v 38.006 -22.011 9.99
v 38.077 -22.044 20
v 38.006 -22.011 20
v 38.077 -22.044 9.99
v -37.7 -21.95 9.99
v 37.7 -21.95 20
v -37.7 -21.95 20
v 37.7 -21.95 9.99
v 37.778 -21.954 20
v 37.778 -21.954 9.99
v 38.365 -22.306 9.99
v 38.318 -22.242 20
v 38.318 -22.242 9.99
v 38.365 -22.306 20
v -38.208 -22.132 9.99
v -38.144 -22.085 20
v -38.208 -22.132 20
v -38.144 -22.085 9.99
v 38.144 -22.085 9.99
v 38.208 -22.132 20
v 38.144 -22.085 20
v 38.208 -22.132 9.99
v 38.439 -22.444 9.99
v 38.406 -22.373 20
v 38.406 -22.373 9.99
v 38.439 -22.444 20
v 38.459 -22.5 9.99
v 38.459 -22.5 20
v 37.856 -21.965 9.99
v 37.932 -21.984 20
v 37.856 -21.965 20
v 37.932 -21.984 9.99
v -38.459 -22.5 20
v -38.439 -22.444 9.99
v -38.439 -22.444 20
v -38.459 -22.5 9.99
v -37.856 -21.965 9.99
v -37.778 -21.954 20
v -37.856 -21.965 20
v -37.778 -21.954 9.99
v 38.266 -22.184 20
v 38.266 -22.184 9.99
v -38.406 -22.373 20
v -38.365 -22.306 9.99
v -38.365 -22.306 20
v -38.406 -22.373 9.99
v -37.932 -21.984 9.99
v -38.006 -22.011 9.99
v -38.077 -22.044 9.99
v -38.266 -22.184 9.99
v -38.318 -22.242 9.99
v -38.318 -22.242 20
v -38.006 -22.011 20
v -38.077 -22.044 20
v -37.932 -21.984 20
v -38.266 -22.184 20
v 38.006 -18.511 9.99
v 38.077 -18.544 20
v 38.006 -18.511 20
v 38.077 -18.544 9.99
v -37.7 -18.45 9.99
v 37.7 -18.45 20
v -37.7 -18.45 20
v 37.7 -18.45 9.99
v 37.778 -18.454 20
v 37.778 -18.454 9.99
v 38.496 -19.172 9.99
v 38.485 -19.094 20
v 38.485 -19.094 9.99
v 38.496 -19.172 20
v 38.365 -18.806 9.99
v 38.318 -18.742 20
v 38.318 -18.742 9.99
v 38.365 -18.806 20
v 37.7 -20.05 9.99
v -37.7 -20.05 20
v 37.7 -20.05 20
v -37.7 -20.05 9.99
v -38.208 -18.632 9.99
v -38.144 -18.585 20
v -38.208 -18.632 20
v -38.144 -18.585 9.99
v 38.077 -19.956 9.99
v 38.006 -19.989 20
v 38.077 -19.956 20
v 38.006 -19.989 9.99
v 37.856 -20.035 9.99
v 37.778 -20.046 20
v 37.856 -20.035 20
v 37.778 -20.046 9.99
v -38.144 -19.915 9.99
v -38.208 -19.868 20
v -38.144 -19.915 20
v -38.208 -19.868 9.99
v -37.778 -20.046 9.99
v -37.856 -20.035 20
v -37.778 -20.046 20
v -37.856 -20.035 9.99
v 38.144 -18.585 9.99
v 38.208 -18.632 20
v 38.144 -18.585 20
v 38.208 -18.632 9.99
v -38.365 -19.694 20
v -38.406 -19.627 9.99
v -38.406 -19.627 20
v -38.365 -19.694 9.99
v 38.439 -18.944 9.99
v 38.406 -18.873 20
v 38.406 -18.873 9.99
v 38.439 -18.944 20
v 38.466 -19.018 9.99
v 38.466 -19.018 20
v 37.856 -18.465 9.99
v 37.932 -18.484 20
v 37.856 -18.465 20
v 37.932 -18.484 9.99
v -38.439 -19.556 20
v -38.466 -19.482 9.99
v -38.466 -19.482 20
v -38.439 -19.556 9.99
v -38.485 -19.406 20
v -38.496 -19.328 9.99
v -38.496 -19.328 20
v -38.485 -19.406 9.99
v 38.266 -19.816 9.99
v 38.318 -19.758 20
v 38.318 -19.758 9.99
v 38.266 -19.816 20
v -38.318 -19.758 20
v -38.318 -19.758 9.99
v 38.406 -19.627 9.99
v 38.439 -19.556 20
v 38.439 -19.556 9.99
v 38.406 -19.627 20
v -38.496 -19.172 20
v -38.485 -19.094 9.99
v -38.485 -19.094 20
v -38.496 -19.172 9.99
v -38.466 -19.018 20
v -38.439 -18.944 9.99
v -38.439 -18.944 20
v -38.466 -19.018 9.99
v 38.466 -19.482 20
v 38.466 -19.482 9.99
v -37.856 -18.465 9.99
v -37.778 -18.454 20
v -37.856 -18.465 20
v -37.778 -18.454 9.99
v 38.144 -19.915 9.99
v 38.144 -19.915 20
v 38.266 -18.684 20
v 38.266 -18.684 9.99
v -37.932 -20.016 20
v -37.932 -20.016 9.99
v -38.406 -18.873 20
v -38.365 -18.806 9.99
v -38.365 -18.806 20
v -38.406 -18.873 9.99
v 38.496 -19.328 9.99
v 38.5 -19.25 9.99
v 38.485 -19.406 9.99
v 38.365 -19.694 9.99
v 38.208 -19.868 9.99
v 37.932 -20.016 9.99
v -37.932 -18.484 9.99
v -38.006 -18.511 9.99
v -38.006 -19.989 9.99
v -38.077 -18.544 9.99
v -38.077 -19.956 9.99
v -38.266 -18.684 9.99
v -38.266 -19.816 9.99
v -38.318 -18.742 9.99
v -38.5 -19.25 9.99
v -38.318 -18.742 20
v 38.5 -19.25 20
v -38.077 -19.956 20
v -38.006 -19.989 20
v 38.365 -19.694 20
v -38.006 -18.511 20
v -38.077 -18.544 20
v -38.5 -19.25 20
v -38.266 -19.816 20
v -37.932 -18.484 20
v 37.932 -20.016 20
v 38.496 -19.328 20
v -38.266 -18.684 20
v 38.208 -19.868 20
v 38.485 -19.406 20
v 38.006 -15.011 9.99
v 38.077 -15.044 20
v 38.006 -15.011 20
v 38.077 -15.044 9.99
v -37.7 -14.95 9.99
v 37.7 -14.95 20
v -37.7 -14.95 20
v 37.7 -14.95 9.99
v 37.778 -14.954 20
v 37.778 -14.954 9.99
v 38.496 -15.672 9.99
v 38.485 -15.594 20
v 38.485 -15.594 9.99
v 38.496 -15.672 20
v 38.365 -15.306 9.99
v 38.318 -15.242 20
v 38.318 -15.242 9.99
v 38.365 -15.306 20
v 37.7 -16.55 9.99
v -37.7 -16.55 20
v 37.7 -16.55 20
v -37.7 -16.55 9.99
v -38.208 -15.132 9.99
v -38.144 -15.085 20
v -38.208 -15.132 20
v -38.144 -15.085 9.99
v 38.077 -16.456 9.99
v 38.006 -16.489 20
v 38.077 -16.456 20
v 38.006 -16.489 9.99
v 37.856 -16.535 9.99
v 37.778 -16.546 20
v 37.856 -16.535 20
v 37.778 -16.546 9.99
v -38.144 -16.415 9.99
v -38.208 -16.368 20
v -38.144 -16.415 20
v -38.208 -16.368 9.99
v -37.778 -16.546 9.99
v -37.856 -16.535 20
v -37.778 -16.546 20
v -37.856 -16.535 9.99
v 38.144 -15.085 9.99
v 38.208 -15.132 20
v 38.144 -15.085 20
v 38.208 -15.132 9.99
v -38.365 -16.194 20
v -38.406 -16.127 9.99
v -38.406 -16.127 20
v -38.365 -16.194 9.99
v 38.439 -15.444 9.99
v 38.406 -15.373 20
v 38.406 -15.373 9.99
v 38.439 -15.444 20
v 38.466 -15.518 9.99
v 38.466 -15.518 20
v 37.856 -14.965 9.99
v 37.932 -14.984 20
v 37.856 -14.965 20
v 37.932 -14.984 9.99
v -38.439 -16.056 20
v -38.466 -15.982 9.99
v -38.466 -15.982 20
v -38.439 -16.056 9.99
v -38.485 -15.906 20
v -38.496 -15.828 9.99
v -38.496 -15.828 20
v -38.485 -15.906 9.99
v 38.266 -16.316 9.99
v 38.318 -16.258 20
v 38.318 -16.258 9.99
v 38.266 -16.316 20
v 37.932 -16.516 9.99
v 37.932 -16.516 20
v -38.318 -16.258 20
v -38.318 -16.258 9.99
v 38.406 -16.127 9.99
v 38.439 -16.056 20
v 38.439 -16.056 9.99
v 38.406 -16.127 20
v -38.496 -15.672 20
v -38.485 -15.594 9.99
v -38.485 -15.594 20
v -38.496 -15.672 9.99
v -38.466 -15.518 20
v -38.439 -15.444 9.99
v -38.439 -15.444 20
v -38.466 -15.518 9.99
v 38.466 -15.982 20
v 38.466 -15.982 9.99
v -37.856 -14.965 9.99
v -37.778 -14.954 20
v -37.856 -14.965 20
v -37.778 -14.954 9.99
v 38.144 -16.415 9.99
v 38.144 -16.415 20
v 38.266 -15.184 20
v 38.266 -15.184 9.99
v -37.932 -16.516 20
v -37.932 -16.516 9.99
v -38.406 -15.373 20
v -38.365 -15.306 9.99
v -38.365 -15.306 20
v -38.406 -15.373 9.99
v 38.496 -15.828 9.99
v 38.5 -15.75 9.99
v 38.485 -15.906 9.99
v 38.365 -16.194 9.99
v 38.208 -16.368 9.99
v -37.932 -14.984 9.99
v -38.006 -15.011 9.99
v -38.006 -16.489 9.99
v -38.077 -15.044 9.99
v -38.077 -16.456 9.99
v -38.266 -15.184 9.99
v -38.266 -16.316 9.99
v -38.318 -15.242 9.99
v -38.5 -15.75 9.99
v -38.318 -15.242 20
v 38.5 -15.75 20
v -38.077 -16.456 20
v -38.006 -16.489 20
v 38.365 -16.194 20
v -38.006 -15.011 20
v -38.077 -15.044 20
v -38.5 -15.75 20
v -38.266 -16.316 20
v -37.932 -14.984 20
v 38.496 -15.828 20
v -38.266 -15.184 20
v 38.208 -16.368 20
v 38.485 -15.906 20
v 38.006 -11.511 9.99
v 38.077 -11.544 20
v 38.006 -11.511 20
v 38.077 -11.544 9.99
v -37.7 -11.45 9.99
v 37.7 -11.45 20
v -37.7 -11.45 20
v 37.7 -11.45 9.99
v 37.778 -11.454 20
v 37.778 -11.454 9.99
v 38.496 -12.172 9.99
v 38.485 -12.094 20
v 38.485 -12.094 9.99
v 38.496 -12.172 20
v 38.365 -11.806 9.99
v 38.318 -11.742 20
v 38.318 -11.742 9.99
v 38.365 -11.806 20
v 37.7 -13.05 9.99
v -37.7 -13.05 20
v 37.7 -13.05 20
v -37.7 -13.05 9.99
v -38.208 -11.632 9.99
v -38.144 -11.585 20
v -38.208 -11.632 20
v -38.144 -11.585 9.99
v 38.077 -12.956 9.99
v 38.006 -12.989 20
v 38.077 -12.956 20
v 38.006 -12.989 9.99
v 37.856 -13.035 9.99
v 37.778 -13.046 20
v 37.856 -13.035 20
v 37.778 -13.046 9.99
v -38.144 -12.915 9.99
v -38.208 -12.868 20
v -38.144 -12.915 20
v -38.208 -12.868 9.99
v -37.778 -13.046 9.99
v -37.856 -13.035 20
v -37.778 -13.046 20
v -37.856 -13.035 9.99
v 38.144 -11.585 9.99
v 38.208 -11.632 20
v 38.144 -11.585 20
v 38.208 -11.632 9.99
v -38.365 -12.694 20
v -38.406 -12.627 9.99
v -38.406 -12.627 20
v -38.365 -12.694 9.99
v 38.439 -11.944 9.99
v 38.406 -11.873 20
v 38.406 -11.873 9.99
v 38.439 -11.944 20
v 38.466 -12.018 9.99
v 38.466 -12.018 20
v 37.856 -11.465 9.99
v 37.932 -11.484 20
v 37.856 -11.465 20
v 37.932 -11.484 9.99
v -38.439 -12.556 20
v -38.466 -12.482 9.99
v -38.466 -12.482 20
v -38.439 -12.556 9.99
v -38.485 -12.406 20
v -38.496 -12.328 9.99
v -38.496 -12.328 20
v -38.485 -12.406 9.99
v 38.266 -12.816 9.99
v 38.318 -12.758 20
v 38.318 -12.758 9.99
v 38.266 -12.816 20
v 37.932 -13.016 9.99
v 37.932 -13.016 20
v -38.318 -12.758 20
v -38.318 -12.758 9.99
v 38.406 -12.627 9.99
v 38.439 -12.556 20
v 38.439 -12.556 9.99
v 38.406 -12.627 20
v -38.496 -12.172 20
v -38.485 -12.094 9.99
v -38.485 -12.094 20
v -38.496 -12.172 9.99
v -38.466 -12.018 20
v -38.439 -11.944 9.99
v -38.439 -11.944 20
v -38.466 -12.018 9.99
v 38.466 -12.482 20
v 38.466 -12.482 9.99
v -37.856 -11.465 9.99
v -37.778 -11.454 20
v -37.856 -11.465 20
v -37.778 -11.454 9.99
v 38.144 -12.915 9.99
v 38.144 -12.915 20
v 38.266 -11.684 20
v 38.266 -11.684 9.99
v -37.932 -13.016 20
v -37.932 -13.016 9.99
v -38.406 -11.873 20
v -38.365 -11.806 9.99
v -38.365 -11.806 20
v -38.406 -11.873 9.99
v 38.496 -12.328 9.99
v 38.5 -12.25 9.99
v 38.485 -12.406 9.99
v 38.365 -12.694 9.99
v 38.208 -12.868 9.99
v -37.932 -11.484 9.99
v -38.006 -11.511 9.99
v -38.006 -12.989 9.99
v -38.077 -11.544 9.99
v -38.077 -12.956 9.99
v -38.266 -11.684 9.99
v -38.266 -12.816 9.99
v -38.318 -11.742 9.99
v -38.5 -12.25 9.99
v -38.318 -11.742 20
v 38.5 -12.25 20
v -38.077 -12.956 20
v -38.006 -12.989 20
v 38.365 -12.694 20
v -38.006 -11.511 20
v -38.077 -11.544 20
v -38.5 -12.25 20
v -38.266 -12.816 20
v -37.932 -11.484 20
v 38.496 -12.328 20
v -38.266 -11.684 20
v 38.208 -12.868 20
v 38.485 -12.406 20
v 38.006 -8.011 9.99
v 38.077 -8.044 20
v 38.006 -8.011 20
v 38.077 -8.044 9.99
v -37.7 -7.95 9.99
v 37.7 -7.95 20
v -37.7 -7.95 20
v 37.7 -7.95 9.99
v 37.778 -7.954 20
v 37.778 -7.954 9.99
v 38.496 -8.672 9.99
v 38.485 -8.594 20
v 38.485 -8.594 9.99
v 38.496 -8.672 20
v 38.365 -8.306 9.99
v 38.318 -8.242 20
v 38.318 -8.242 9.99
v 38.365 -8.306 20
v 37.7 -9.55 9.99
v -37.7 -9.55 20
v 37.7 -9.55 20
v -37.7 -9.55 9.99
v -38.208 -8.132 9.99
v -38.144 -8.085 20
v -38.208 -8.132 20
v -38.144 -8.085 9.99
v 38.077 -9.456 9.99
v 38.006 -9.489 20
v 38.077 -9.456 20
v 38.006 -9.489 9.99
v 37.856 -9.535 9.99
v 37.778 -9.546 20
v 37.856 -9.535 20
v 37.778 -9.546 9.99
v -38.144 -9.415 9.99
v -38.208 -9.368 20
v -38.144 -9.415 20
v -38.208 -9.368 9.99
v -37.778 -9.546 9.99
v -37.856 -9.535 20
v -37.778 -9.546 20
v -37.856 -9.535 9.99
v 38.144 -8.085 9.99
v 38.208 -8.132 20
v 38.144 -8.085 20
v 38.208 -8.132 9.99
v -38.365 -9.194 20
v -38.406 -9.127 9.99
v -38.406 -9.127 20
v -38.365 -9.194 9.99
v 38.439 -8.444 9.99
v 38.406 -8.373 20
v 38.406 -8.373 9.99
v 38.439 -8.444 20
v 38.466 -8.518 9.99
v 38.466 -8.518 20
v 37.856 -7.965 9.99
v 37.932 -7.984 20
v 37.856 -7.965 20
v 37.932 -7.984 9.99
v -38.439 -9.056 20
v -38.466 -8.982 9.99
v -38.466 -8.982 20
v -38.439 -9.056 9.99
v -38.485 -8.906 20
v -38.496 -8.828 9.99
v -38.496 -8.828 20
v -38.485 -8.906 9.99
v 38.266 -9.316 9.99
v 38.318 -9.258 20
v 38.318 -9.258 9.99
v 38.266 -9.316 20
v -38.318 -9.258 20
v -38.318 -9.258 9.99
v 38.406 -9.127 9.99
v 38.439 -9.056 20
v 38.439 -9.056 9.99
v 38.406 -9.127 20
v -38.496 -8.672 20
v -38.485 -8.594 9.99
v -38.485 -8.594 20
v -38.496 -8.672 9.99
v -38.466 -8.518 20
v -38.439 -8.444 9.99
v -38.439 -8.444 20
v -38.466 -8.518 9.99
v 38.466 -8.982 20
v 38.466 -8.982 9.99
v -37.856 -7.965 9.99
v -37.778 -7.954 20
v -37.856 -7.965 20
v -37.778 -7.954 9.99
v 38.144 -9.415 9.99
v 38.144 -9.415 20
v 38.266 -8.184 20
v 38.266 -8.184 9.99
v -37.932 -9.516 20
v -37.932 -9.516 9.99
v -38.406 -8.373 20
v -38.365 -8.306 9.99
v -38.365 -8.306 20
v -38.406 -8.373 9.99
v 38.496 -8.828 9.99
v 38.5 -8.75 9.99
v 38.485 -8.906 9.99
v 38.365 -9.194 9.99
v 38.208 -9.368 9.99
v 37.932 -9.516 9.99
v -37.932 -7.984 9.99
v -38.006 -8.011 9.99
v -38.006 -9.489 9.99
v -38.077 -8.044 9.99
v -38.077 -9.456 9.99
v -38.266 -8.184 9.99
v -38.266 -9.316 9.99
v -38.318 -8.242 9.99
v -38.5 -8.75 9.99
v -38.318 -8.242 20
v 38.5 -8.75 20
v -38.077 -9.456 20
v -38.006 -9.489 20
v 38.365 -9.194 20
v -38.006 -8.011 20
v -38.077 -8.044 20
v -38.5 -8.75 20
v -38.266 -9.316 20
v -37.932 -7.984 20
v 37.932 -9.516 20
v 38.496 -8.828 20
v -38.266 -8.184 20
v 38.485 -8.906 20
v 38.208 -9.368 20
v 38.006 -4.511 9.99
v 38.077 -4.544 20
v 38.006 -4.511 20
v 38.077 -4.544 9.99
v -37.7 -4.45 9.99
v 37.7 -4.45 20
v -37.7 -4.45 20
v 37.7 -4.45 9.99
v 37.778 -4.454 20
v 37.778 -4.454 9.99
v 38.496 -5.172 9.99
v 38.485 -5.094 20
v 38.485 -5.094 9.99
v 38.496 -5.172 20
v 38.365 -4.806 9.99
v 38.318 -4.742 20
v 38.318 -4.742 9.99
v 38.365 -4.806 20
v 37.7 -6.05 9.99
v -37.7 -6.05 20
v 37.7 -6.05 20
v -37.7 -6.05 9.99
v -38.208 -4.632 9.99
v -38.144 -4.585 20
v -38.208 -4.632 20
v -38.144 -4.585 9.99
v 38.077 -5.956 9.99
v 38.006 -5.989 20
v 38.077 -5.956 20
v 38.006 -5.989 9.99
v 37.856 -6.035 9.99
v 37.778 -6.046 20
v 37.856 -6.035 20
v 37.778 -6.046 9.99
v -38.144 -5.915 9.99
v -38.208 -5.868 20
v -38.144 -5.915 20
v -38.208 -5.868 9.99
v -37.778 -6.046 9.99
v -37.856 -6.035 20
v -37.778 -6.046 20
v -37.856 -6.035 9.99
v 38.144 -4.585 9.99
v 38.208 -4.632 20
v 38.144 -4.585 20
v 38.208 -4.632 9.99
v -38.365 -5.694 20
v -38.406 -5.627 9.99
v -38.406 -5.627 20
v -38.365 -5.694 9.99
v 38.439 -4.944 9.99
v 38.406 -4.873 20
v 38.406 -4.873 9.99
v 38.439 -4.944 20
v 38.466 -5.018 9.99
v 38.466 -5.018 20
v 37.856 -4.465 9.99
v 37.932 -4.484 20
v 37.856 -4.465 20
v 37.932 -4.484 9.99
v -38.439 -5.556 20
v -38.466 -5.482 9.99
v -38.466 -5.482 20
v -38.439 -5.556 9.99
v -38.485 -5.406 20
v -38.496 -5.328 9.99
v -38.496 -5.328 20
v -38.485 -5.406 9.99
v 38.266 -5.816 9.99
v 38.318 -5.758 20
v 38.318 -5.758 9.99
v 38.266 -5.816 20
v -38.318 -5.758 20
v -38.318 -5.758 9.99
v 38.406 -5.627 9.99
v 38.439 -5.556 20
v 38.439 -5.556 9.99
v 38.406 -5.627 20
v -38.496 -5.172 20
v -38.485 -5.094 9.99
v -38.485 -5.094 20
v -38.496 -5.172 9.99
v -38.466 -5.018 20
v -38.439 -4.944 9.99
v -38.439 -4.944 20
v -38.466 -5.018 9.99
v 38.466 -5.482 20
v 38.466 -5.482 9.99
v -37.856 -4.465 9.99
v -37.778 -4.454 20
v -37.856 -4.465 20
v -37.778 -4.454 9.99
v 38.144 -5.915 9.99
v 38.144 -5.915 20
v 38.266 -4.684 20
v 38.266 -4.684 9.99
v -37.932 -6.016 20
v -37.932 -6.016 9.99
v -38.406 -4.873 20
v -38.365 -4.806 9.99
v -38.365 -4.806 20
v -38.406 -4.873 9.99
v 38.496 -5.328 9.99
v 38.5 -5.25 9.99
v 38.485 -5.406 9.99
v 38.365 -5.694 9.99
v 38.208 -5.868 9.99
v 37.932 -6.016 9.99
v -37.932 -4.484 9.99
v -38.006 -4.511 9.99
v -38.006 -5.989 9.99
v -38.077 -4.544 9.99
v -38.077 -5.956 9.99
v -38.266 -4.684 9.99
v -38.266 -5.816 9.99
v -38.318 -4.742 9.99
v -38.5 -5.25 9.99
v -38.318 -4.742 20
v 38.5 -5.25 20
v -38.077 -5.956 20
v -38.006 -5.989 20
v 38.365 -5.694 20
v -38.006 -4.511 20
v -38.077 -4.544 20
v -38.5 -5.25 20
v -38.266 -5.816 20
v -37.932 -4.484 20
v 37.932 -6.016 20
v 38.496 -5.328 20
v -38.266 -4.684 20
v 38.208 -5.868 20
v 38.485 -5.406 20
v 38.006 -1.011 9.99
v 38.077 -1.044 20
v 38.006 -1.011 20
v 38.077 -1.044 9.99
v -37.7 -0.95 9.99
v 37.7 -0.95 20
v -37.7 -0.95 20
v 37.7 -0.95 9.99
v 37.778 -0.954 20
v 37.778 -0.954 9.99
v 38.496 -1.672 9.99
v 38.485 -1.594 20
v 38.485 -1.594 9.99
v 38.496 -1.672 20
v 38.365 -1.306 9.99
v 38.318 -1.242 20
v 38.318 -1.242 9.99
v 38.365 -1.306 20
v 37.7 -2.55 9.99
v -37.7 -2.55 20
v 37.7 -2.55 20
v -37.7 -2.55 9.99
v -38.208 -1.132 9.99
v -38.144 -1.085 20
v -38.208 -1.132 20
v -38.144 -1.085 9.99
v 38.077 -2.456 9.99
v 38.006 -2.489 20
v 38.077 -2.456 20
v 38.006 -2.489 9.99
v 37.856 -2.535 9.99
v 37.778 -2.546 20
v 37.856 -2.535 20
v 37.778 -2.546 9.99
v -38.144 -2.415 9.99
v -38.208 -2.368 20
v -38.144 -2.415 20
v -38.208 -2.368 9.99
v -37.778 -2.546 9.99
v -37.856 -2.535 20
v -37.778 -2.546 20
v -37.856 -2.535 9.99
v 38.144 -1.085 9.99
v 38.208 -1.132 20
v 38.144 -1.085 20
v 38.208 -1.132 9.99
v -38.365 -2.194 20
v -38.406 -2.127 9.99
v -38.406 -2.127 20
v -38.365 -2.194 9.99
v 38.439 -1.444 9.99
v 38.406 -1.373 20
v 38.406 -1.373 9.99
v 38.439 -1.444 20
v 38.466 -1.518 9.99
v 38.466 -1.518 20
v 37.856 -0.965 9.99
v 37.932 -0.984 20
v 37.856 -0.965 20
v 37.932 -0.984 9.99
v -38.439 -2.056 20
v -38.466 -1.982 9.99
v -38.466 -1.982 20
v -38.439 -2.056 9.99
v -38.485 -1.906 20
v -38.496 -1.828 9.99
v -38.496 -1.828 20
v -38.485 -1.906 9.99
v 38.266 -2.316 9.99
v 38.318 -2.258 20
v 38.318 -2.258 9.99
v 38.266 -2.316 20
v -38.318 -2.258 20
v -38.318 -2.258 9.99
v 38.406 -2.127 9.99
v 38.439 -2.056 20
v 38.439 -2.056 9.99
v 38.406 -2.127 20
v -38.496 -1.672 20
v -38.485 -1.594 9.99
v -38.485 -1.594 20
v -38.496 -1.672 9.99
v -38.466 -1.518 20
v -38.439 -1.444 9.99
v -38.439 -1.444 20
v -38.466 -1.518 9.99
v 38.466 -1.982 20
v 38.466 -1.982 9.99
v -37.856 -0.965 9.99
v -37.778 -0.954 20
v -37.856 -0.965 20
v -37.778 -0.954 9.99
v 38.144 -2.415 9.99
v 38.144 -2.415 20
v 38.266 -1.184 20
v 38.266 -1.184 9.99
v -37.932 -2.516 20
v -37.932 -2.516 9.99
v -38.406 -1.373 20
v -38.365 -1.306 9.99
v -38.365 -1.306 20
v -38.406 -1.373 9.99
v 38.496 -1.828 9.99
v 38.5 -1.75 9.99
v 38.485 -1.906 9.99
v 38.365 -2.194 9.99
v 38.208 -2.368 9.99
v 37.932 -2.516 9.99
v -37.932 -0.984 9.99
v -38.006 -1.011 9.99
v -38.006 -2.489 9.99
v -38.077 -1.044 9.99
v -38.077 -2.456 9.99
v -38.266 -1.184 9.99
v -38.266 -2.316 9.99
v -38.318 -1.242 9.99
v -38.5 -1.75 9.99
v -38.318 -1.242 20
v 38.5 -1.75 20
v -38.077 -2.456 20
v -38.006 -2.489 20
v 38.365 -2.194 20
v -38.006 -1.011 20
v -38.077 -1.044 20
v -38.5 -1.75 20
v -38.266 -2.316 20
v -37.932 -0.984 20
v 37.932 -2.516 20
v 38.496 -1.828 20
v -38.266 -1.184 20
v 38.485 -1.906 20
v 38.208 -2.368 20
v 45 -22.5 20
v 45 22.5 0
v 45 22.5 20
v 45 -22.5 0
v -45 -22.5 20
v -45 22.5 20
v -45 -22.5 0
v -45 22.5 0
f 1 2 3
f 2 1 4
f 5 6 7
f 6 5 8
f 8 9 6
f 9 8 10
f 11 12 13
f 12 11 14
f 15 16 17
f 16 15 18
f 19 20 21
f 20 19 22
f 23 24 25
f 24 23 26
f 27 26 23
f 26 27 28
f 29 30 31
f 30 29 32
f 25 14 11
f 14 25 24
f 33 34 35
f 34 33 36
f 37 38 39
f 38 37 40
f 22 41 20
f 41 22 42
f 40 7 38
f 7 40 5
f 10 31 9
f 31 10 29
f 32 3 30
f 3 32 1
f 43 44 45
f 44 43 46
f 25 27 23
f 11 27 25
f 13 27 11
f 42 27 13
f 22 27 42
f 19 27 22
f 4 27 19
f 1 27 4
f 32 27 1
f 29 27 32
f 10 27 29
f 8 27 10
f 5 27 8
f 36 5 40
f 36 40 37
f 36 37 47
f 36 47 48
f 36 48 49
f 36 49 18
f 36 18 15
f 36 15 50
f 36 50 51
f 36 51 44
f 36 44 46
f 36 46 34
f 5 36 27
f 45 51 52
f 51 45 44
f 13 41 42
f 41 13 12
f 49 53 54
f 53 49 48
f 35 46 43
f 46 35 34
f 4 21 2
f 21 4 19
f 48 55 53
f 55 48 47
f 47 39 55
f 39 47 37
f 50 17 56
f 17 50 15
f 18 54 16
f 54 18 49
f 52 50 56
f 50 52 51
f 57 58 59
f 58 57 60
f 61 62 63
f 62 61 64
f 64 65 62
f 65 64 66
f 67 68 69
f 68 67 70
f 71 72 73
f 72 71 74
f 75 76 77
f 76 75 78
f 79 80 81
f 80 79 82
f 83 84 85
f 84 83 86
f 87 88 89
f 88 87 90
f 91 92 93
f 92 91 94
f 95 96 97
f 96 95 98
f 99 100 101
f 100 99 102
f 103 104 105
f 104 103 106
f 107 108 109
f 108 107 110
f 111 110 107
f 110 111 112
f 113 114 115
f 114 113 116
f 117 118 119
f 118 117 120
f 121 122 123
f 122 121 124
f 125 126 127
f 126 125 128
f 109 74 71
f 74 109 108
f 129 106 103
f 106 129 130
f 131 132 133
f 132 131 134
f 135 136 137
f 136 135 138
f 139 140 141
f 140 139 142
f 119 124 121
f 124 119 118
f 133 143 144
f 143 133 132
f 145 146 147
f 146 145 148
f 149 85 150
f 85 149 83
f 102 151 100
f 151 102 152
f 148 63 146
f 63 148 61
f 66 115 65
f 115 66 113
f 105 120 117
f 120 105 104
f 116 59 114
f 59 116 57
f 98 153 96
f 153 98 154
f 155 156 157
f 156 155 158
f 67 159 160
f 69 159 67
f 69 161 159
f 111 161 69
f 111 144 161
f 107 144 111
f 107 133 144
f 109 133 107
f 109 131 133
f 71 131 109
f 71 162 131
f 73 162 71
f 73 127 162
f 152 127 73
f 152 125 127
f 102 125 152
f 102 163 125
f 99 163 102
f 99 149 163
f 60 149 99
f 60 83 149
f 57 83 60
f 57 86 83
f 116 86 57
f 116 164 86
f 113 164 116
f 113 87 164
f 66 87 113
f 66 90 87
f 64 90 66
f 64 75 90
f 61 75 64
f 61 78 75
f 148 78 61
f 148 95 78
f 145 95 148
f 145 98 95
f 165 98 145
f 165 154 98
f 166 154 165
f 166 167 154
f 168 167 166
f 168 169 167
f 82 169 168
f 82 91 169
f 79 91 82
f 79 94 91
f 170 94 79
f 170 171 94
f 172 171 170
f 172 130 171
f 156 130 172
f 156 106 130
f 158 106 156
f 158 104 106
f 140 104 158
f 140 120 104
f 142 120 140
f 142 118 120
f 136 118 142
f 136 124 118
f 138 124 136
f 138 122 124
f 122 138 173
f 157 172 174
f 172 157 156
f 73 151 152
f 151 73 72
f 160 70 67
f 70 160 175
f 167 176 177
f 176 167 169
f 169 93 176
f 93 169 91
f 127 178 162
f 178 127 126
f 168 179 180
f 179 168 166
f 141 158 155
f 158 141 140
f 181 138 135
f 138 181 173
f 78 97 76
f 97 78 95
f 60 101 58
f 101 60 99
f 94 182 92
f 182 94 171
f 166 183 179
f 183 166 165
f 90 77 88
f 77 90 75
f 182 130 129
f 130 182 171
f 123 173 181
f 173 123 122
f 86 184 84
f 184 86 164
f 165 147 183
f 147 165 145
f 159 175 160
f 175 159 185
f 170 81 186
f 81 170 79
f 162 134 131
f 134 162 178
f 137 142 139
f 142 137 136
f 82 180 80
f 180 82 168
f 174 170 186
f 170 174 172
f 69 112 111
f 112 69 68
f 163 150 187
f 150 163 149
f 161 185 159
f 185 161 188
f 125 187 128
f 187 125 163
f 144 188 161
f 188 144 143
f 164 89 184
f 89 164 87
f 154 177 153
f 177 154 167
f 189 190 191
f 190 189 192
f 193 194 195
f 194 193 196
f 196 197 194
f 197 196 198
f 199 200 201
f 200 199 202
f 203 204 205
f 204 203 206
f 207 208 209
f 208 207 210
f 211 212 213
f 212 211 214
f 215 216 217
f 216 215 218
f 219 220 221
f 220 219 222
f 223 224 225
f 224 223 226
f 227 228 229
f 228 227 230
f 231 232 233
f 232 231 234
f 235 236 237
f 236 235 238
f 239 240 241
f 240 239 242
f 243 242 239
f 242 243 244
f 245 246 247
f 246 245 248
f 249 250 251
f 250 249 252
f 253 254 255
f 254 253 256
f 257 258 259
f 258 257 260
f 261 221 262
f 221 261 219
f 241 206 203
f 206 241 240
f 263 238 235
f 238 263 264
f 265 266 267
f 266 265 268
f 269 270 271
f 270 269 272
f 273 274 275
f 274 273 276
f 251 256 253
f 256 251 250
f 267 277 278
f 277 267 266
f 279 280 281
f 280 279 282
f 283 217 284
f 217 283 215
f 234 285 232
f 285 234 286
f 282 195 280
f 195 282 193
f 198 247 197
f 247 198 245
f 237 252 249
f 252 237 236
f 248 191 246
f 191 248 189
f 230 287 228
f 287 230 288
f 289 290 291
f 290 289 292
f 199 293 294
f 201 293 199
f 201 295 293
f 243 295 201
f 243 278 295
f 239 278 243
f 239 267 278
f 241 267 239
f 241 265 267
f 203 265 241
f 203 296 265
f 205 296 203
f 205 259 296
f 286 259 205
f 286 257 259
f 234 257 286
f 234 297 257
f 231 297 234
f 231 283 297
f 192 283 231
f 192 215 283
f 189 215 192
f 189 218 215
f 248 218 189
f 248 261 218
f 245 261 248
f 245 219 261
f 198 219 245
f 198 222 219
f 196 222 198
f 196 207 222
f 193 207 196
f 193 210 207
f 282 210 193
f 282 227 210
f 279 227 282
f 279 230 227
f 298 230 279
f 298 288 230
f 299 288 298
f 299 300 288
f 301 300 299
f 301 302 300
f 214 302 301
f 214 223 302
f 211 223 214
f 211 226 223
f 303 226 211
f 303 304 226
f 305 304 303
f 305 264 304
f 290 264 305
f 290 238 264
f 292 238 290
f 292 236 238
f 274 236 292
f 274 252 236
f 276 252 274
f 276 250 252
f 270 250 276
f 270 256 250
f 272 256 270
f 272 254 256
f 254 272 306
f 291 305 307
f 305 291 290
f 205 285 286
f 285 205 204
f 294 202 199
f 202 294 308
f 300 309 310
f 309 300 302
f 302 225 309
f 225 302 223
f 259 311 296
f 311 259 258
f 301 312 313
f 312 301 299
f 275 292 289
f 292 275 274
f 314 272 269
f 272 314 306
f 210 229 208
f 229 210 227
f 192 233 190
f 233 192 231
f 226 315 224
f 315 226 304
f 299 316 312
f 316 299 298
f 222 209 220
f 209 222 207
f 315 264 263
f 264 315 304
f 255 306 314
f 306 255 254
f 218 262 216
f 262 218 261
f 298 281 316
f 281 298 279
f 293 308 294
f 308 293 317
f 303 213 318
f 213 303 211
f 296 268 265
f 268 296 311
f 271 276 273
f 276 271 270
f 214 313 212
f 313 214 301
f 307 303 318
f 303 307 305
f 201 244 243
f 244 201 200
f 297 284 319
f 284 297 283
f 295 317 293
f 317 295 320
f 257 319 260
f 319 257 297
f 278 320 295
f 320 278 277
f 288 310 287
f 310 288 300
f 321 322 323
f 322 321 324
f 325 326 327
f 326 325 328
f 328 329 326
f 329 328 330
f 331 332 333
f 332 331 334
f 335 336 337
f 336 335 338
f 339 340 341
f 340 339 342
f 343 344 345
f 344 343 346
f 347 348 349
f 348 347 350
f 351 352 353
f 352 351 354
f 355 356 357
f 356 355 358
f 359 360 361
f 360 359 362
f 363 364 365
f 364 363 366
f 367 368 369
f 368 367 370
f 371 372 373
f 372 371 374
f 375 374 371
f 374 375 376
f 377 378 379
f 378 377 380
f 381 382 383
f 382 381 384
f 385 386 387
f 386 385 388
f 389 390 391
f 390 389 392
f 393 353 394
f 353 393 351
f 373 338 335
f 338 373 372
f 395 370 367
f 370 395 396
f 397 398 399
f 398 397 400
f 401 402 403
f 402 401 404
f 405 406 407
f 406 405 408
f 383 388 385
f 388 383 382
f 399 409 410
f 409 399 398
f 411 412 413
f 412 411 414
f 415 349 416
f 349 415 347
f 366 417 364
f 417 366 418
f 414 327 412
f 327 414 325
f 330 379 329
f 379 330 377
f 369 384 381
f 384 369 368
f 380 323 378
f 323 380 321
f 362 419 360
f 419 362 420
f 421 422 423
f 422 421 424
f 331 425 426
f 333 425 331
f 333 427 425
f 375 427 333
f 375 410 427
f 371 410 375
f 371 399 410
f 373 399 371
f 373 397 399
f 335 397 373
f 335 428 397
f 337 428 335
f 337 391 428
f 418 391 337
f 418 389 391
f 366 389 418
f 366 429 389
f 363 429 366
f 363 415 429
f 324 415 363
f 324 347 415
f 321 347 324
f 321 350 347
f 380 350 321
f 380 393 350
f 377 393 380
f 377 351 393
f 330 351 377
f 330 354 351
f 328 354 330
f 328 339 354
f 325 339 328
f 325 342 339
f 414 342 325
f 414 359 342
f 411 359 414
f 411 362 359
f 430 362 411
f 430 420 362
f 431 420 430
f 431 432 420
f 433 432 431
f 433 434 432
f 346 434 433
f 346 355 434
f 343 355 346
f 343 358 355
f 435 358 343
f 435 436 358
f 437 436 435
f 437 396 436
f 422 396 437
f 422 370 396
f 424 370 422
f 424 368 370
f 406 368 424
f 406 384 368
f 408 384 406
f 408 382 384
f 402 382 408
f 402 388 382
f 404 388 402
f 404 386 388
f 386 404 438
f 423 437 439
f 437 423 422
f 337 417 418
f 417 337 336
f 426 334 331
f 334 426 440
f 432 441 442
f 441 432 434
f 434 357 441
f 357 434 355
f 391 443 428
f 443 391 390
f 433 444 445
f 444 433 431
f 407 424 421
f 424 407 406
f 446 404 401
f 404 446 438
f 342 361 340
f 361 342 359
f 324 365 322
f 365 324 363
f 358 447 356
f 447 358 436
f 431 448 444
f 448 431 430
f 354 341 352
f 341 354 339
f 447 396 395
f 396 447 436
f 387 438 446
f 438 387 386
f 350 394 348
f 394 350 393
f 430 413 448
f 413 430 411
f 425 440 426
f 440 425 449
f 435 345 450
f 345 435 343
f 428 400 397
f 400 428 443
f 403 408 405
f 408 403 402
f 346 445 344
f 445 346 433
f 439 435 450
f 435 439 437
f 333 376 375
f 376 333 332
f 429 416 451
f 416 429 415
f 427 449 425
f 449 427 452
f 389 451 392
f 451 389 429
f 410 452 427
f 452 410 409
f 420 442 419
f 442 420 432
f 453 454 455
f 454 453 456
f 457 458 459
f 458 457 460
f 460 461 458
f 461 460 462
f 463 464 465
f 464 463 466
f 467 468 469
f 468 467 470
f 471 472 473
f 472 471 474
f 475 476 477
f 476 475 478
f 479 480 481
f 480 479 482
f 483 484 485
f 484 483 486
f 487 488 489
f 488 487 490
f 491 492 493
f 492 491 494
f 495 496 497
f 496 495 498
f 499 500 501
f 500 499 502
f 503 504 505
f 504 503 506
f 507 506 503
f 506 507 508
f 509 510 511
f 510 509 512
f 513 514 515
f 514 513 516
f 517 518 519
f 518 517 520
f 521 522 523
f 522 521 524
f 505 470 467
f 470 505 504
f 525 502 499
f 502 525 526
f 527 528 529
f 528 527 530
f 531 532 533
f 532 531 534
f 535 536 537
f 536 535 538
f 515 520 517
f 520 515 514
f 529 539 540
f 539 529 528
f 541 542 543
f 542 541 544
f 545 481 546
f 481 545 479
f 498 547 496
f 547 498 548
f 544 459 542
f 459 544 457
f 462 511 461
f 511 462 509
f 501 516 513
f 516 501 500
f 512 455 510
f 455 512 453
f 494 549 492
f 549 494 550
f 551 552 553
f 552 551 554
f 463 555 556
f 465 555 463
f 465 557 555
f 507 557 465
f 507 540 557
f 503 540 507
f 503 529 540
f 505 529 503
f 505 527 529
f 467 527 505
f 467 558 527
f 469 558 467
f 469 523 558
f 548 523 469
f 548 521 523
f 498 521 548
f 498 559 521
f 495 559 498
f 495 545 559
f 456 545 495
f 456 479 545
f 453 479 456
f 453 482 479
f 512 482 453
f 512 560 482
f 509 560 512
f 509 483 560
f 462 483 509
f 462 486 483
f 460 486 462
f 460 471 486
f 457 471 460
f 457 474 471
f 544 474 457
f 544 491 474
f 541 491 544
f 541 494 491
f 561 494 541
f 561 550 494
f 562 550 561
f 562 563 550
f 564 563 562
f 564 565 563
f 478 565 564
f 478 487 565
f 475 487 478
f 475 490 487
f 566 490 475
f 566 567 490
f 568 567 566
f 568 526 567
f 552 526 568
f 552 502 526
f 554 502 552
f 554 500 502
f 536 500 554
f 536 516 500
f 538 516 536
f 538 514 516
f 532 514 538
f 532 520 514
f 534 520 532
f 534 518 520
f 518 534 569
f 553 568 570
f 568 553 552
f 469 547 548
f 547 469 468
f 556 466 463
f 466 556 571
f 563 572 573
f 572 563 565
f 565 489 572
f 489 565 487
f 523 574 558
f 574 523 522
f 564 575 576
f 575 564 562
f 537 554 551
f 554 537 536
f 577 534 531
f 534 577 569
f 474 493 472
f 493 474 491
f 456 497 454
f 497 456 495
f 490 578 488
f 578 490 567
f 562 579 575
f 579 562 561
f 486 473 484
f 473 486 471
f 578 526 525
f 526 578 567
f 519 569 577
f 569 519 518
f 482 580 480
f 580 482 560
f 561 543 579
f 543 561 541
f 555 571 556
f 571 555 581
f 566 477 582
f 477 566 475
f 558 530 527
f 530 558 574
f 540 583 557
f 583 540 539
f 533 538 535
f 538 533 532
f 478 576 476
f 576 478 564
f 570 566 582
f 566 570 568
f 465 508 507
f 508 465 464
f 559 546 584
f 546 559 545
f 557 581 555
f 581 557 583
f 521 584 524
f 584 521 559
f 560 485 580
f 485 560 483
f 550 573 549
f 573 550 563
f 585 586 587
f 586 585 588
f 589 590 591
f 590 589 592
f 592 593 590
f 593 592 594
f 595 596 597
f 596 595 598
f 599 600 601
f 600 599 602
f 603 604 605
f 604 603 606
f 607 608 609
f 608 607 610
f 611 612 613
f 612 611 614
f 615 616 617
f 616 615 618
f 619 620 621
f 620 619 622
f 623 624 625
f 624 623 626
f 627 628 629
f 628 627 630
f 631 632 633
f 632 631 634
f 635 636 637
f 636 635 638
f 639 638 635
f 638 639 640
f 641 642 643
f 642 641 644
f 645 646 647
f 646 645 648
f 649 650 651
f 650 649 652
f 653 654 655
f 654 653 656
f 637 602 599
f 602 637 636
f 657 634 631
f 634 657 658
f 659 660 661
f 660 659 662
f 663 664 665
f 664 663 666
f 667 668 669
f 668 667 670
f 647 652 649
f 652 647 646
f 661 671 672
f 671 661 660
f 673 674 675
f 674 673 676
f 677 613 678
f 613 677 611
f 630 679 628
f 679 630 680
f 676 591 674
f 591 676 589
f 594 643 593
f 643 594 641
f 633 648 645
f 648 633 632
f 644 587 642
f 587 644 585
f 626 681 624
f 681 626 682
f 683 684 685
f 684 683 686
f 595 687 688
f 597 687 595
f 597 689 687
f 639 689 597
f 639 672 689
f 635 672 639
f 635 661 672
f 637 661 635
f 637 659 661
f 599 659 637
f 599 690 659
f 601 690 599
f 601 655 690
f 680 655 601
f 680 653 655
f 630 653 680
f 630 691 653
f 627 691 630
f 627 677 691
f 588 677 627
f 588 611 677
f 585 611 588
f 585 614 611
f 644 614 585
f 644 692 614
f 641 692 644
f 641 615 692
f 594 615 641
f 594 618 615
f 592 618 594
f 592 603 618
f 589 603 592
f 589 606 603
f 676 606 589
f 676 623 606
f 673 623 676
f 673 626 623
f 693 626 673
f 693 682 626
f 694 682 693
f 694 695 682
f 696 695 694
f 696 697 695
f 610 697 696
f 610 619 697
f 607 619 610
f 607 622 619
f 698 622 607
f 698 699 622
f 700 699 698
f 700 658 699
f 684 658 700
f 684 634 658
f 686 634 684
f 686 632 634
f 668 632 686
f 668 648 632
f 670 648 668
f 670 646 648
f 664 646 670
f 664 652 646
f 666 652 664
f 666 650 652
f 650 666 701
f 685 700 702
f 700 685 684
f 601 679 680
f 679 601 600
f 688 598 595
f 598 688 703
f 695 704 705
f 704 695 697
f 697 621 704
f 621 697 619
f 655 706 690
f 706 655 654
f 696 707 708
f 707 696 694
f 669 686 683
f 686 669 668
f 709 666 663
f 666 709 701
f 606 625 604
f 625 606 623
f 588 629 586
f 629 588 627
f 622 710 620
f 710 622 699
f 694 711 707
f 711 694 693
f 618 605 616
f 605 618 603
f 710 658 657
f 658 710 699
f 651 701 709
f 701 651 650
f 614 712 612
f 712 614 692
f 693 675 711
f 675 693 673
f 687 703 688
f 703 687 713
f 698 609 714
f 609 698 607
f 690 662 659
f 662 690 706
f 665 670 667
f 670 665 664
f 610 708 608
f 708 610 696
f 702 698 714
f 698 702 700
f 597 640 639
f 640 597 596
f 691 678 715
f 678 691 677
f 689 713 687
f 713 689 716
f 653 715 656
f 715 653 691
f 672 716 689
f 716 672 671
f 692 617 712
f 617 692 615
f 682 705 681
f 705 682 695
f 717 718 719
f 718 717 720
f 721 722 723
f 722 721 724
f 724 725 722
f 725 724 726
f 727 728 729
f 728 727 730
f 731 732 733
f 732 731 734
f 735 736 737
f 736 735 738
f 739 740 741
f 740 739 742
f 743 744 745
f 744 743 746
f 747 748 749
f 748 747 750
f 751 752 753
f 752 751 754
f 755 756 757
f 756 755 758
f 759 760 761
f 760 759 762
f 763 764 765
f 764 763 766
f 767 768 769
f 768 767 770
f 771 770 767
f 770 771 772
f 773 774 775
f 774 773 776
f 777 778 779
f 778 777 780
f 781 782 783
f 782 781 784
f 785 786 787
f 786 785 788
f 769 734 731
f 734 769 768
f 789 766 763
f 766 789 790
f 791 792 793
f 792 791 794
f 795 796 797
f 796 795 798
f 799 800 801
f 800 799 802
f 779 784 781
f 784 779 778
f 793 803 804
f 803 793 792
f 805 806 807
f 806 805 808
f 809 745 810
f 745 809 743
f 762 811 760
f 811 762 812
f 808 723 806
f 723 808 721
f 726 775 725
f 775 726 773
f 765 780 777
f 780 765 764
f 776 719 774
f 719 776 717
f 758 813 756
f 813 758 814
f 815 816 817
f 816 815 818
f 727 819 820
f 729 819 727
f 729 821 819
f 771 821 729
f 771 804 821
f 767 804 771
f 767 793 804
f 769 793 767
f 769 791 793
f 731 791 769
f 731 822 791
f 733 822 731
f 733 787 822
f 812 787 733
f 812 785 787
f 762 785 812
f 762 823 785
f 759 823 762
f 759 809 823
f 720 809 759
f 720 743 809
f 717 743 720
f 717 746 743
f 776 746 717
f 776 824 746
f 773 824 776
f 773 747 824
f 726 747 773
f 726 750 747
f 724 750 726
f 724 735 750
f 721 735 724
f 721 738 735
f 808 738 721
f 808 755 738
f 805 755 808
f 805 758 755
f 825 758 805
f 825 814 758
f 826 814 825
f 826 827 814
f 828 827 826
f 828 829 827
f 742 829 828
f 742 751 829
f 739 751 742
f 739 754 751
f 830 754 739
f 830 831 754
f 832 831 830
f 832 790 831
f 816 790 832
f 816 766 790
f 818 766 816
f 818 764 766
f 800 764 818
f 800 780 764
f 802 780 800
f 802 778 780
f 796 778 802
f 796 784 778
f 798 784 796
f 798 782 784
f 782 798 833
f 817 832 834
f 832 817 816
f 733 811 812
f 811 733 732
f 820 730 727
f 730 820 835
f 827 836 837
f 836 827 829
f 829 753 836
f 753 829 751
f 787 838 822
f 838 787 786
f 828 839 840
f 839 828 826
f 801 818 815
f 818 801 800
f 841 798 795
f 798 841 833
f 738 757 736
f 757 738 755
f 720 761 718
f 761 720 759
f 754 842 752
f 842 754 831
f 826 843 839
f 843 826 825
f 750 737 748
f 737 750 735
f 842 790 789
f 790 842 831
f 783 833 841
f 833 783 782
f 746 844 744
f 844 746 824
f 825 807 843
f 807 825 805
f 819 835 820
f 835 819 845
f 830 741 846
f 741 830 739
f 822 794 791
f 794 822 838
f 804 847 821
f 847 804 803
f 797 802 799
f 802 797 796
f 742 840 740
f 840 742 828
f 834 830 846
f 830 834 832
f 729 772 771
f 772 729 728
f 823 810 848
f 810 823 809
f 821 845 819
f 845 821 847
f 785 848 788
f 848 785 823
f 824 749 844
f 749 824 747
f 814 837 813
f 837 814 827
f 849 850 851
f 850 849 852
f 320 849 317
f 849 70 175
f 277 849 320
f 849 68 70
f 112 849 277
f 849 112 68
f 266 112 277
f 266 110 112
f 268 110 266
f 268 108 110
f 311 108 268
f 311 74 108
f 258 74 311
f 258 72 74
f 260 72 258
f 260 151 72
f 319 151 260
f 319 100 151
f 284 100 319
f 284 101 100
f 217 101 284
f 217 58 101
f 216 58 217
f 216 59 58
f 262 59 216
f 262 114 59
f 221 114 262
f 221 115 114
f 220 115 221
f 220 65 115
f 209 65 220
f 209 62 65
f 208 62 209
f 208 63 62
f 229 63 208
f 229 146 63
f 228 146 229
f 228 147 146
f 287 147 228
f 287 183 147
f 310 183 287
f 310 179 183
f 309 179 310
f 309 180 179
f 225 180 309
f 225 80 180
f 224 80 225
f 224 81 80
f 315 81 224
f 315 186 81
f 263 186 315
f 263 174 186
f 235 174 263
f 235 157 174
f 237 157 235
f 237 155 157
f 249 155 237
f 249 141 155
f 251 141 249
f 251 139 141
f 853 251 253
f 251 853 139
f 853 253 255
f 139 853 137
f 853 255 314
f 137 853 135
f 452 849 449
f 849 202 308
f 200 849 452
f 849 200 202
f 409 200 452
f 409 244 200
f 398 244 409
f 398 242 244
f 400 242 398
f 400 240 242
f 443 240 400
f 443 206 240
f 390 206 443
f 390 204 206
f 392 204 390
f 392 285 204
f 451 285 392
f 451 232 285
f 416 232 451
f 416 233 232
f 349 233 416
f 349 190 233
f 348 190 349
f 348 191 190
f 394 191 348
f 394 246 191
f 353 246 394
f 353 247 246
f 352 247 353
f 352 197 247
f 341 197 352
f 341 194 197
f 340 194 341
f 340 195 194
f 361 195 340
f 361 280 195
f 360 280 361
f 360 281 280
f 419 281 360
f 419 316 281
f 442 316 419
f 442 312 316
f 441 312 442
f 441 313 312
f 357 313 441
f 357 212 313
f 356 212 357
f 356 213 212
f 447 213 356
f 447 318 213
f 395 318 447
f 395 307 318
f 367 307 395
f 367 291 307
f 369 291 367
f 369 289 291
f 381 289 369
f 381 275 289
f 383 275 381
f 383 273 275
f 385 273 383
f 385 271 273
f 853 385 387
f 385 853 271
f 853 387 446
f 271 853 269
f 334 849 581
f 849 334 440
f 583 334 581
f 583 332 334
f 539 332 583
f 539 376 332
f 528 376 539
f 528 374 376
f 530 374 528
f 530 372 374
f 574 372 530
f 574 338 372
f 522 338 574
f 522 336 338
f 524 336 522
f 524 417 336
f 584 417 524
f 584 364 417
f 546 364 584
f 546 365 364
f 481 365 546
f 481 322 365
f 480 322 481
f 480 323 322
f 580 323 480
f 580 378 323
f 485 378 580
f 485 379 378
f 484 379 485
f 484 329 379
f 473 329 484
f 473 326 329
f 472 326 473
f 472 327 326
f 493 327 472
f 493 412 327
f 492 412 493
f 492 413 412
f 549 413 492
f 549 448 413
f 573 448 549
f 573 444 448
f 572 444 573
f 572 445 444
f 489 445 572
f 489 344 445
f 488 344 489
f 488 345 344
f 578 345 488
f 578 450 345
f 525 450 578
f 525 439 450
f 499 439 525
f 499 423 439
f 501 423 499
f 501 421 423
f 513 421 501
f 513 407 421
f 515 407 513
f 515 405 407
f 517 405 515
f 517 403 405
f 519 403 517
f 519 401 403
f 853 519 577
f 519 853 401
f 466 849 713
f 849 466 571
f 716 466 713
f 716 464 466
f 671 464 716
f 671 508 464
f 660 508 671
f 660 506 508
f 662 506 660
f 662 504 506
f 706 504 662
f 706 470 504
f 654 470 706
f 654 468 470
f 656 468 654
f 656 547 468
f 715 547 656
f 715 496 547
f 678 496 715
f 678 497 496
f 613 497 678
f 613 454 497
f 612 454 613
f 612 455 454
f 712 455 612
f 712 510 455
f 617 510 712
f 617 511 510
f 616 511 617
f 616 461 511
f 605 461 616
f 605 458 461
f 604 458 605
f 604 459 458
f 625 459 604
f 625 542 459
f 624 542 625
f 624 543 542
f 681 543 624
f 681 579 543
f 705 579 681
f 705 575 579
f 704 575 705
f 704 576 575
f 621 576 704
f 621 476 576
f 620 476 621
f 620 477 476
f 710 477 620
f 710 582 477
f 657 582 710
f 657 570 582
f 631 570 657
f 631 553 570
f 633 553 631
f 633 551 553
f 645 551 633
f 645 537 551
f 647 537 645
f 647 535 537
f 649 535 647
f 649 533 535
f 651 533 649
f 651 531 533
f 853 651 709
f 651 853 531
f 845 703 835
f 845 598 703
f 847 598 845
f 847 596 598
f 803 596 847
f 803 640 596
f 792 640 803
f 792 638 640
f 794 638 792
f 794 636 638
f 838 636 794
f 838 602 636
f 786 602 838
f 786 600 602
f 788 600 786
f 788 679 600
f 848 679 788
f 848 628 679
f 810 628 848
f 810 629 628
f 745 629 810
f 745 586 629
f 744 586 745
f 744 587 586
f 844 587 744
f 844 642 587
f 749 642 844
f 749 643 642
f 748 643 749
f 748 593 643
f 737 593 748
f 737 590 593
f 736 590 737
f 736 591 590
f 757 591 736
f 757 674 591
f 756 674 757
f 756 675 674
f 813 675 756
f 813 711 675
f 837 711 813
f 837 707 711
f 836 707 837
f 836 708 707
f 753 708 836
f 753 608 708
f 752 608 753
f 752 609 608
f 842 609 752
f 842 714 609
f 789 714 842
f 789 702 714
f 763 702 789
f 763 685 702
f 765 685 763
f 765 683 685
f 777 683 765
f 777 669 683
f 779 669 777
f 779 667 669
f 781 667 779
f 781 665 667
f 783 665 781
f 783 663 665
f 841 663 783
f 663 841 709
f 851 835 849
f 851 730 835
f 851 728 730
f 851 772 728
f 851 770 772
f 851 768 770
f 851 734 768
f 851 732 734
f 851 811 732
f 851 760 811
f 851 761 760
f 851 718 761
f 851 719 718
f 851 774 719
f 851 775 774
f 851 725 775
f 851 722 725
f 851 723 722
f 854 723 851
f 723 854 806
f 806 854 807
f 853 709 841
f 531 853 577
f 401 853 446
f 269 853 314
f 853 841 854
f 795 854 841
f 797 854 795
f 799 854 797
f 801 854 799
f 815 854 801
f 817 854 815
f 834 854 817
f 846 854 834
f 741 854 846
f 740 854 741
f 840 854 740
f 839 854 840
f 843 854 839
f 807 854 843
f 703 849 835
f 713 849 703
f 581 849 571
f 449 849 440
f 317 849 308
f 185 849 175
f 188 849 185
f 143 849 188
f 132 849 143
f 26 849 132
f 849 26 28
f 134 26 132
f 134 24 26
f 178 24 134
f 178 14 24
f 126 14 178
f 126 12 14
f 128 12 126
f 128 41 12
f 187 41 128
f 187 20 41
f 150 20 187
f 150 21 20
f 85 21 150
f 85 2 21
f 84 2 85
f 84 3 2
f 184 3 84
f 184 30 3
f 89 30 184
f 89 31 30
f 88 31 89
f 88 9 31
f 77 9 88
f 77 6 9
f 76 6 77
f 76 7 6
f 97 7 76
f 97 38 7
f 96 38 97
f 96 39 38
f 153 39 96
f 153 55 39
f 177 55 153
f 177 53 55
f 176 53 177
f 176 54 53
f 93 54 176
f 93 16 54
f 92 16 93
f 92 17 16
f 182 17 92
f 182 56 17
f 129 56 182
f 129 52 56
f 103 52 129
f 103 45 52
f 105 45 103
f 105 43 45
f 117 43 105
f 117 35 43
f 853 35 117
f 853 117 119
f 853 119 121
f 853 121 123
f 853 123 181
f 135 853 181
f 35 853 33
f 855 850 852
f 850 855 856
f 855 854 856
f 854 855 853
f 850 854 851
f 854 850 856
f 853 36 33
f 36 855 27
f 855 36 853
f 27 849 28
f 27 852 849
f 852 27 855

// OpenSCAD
// Built by bench/smallmodels/features/compiler.py from a list of features.
$fn = 64;
difference() {
  union() {
    translate([0, 0, 0]) translate([-45, -22.5, 0]) cube([90, 45, 20]);
  }
  union() {
    translate([0, -33.25, 9.99]) rotate([0, 0, 0]) hull() { for (s = [-1, 1]) translate([s * 37.7, 0, 0]) cylinder(d = 1.6, h = 10.02); }
    translate([0, -29.75, 9.99]) rotate([0, 0, 0]) hull() { for (s = [-1, 1]) translate([s * 37.7, 0, 0]) cylinder(d = 1.6, h = 10.02); }
    translate([0, -26.25, 9.99]) rotate([0, 0, 0]) hull() { for (s = [-1, 1]) translate([s * 37.7, 0, 0]) cylinder(d = 1.6, h = 10.02); }
    translate([0, -22.75, 9.99]) rotate([0, 0, 0]) hull() { for (s = [-1, 1]) translate([s * 37.7, 0, 0]) cylinder(d = 1.6, h = 10.02); }
    translate([0, -19.25, 9.99]) rotate([0, 0, 0]) hull() { for (s = [-1, 1]) translate([s * 37.7, 0, 0]) cylinder(d = 1.6, h = 10.02); }
    translate([0, -15.75, 9.99]) rotate([0, 0, 0]) hull() { for (s = [-1, 1]) translate([s * 37.7, 0, 0]) cylinder(d = 1.6, h = 10.02); }
    translate([0, -12.25, 9.99]) rotate([0, 0, 0]) hull() { for (s = [-1, 1]) translate([s * 37.7, 0, 0]) cylinder(d = 1.6, h = 10.02); }
    translate([0, -8.75, 9.99]) rotate([0, 0, 0]) hull() { for (s = [-1, 1]) translate([s * 37.7, 0, 0]) cylinder(d = 1.6, h = 10.02); }
    translate([0, -5.25, 9.99]) rotate([0, 0, 0]) hull() { for (s = [-1, 1]) translate([s * 37.7, 0, 0]) cylinder(d = 1.6, h = 10.02); }
    translate([0, -1.75, 9.99]) rotate([0, 0, 0]) hull() { for (s = [-1, 1]) translate([s * 37.7, 0, 0]) cylinder(d = 1.6, h = 10.02); }
  }
}
